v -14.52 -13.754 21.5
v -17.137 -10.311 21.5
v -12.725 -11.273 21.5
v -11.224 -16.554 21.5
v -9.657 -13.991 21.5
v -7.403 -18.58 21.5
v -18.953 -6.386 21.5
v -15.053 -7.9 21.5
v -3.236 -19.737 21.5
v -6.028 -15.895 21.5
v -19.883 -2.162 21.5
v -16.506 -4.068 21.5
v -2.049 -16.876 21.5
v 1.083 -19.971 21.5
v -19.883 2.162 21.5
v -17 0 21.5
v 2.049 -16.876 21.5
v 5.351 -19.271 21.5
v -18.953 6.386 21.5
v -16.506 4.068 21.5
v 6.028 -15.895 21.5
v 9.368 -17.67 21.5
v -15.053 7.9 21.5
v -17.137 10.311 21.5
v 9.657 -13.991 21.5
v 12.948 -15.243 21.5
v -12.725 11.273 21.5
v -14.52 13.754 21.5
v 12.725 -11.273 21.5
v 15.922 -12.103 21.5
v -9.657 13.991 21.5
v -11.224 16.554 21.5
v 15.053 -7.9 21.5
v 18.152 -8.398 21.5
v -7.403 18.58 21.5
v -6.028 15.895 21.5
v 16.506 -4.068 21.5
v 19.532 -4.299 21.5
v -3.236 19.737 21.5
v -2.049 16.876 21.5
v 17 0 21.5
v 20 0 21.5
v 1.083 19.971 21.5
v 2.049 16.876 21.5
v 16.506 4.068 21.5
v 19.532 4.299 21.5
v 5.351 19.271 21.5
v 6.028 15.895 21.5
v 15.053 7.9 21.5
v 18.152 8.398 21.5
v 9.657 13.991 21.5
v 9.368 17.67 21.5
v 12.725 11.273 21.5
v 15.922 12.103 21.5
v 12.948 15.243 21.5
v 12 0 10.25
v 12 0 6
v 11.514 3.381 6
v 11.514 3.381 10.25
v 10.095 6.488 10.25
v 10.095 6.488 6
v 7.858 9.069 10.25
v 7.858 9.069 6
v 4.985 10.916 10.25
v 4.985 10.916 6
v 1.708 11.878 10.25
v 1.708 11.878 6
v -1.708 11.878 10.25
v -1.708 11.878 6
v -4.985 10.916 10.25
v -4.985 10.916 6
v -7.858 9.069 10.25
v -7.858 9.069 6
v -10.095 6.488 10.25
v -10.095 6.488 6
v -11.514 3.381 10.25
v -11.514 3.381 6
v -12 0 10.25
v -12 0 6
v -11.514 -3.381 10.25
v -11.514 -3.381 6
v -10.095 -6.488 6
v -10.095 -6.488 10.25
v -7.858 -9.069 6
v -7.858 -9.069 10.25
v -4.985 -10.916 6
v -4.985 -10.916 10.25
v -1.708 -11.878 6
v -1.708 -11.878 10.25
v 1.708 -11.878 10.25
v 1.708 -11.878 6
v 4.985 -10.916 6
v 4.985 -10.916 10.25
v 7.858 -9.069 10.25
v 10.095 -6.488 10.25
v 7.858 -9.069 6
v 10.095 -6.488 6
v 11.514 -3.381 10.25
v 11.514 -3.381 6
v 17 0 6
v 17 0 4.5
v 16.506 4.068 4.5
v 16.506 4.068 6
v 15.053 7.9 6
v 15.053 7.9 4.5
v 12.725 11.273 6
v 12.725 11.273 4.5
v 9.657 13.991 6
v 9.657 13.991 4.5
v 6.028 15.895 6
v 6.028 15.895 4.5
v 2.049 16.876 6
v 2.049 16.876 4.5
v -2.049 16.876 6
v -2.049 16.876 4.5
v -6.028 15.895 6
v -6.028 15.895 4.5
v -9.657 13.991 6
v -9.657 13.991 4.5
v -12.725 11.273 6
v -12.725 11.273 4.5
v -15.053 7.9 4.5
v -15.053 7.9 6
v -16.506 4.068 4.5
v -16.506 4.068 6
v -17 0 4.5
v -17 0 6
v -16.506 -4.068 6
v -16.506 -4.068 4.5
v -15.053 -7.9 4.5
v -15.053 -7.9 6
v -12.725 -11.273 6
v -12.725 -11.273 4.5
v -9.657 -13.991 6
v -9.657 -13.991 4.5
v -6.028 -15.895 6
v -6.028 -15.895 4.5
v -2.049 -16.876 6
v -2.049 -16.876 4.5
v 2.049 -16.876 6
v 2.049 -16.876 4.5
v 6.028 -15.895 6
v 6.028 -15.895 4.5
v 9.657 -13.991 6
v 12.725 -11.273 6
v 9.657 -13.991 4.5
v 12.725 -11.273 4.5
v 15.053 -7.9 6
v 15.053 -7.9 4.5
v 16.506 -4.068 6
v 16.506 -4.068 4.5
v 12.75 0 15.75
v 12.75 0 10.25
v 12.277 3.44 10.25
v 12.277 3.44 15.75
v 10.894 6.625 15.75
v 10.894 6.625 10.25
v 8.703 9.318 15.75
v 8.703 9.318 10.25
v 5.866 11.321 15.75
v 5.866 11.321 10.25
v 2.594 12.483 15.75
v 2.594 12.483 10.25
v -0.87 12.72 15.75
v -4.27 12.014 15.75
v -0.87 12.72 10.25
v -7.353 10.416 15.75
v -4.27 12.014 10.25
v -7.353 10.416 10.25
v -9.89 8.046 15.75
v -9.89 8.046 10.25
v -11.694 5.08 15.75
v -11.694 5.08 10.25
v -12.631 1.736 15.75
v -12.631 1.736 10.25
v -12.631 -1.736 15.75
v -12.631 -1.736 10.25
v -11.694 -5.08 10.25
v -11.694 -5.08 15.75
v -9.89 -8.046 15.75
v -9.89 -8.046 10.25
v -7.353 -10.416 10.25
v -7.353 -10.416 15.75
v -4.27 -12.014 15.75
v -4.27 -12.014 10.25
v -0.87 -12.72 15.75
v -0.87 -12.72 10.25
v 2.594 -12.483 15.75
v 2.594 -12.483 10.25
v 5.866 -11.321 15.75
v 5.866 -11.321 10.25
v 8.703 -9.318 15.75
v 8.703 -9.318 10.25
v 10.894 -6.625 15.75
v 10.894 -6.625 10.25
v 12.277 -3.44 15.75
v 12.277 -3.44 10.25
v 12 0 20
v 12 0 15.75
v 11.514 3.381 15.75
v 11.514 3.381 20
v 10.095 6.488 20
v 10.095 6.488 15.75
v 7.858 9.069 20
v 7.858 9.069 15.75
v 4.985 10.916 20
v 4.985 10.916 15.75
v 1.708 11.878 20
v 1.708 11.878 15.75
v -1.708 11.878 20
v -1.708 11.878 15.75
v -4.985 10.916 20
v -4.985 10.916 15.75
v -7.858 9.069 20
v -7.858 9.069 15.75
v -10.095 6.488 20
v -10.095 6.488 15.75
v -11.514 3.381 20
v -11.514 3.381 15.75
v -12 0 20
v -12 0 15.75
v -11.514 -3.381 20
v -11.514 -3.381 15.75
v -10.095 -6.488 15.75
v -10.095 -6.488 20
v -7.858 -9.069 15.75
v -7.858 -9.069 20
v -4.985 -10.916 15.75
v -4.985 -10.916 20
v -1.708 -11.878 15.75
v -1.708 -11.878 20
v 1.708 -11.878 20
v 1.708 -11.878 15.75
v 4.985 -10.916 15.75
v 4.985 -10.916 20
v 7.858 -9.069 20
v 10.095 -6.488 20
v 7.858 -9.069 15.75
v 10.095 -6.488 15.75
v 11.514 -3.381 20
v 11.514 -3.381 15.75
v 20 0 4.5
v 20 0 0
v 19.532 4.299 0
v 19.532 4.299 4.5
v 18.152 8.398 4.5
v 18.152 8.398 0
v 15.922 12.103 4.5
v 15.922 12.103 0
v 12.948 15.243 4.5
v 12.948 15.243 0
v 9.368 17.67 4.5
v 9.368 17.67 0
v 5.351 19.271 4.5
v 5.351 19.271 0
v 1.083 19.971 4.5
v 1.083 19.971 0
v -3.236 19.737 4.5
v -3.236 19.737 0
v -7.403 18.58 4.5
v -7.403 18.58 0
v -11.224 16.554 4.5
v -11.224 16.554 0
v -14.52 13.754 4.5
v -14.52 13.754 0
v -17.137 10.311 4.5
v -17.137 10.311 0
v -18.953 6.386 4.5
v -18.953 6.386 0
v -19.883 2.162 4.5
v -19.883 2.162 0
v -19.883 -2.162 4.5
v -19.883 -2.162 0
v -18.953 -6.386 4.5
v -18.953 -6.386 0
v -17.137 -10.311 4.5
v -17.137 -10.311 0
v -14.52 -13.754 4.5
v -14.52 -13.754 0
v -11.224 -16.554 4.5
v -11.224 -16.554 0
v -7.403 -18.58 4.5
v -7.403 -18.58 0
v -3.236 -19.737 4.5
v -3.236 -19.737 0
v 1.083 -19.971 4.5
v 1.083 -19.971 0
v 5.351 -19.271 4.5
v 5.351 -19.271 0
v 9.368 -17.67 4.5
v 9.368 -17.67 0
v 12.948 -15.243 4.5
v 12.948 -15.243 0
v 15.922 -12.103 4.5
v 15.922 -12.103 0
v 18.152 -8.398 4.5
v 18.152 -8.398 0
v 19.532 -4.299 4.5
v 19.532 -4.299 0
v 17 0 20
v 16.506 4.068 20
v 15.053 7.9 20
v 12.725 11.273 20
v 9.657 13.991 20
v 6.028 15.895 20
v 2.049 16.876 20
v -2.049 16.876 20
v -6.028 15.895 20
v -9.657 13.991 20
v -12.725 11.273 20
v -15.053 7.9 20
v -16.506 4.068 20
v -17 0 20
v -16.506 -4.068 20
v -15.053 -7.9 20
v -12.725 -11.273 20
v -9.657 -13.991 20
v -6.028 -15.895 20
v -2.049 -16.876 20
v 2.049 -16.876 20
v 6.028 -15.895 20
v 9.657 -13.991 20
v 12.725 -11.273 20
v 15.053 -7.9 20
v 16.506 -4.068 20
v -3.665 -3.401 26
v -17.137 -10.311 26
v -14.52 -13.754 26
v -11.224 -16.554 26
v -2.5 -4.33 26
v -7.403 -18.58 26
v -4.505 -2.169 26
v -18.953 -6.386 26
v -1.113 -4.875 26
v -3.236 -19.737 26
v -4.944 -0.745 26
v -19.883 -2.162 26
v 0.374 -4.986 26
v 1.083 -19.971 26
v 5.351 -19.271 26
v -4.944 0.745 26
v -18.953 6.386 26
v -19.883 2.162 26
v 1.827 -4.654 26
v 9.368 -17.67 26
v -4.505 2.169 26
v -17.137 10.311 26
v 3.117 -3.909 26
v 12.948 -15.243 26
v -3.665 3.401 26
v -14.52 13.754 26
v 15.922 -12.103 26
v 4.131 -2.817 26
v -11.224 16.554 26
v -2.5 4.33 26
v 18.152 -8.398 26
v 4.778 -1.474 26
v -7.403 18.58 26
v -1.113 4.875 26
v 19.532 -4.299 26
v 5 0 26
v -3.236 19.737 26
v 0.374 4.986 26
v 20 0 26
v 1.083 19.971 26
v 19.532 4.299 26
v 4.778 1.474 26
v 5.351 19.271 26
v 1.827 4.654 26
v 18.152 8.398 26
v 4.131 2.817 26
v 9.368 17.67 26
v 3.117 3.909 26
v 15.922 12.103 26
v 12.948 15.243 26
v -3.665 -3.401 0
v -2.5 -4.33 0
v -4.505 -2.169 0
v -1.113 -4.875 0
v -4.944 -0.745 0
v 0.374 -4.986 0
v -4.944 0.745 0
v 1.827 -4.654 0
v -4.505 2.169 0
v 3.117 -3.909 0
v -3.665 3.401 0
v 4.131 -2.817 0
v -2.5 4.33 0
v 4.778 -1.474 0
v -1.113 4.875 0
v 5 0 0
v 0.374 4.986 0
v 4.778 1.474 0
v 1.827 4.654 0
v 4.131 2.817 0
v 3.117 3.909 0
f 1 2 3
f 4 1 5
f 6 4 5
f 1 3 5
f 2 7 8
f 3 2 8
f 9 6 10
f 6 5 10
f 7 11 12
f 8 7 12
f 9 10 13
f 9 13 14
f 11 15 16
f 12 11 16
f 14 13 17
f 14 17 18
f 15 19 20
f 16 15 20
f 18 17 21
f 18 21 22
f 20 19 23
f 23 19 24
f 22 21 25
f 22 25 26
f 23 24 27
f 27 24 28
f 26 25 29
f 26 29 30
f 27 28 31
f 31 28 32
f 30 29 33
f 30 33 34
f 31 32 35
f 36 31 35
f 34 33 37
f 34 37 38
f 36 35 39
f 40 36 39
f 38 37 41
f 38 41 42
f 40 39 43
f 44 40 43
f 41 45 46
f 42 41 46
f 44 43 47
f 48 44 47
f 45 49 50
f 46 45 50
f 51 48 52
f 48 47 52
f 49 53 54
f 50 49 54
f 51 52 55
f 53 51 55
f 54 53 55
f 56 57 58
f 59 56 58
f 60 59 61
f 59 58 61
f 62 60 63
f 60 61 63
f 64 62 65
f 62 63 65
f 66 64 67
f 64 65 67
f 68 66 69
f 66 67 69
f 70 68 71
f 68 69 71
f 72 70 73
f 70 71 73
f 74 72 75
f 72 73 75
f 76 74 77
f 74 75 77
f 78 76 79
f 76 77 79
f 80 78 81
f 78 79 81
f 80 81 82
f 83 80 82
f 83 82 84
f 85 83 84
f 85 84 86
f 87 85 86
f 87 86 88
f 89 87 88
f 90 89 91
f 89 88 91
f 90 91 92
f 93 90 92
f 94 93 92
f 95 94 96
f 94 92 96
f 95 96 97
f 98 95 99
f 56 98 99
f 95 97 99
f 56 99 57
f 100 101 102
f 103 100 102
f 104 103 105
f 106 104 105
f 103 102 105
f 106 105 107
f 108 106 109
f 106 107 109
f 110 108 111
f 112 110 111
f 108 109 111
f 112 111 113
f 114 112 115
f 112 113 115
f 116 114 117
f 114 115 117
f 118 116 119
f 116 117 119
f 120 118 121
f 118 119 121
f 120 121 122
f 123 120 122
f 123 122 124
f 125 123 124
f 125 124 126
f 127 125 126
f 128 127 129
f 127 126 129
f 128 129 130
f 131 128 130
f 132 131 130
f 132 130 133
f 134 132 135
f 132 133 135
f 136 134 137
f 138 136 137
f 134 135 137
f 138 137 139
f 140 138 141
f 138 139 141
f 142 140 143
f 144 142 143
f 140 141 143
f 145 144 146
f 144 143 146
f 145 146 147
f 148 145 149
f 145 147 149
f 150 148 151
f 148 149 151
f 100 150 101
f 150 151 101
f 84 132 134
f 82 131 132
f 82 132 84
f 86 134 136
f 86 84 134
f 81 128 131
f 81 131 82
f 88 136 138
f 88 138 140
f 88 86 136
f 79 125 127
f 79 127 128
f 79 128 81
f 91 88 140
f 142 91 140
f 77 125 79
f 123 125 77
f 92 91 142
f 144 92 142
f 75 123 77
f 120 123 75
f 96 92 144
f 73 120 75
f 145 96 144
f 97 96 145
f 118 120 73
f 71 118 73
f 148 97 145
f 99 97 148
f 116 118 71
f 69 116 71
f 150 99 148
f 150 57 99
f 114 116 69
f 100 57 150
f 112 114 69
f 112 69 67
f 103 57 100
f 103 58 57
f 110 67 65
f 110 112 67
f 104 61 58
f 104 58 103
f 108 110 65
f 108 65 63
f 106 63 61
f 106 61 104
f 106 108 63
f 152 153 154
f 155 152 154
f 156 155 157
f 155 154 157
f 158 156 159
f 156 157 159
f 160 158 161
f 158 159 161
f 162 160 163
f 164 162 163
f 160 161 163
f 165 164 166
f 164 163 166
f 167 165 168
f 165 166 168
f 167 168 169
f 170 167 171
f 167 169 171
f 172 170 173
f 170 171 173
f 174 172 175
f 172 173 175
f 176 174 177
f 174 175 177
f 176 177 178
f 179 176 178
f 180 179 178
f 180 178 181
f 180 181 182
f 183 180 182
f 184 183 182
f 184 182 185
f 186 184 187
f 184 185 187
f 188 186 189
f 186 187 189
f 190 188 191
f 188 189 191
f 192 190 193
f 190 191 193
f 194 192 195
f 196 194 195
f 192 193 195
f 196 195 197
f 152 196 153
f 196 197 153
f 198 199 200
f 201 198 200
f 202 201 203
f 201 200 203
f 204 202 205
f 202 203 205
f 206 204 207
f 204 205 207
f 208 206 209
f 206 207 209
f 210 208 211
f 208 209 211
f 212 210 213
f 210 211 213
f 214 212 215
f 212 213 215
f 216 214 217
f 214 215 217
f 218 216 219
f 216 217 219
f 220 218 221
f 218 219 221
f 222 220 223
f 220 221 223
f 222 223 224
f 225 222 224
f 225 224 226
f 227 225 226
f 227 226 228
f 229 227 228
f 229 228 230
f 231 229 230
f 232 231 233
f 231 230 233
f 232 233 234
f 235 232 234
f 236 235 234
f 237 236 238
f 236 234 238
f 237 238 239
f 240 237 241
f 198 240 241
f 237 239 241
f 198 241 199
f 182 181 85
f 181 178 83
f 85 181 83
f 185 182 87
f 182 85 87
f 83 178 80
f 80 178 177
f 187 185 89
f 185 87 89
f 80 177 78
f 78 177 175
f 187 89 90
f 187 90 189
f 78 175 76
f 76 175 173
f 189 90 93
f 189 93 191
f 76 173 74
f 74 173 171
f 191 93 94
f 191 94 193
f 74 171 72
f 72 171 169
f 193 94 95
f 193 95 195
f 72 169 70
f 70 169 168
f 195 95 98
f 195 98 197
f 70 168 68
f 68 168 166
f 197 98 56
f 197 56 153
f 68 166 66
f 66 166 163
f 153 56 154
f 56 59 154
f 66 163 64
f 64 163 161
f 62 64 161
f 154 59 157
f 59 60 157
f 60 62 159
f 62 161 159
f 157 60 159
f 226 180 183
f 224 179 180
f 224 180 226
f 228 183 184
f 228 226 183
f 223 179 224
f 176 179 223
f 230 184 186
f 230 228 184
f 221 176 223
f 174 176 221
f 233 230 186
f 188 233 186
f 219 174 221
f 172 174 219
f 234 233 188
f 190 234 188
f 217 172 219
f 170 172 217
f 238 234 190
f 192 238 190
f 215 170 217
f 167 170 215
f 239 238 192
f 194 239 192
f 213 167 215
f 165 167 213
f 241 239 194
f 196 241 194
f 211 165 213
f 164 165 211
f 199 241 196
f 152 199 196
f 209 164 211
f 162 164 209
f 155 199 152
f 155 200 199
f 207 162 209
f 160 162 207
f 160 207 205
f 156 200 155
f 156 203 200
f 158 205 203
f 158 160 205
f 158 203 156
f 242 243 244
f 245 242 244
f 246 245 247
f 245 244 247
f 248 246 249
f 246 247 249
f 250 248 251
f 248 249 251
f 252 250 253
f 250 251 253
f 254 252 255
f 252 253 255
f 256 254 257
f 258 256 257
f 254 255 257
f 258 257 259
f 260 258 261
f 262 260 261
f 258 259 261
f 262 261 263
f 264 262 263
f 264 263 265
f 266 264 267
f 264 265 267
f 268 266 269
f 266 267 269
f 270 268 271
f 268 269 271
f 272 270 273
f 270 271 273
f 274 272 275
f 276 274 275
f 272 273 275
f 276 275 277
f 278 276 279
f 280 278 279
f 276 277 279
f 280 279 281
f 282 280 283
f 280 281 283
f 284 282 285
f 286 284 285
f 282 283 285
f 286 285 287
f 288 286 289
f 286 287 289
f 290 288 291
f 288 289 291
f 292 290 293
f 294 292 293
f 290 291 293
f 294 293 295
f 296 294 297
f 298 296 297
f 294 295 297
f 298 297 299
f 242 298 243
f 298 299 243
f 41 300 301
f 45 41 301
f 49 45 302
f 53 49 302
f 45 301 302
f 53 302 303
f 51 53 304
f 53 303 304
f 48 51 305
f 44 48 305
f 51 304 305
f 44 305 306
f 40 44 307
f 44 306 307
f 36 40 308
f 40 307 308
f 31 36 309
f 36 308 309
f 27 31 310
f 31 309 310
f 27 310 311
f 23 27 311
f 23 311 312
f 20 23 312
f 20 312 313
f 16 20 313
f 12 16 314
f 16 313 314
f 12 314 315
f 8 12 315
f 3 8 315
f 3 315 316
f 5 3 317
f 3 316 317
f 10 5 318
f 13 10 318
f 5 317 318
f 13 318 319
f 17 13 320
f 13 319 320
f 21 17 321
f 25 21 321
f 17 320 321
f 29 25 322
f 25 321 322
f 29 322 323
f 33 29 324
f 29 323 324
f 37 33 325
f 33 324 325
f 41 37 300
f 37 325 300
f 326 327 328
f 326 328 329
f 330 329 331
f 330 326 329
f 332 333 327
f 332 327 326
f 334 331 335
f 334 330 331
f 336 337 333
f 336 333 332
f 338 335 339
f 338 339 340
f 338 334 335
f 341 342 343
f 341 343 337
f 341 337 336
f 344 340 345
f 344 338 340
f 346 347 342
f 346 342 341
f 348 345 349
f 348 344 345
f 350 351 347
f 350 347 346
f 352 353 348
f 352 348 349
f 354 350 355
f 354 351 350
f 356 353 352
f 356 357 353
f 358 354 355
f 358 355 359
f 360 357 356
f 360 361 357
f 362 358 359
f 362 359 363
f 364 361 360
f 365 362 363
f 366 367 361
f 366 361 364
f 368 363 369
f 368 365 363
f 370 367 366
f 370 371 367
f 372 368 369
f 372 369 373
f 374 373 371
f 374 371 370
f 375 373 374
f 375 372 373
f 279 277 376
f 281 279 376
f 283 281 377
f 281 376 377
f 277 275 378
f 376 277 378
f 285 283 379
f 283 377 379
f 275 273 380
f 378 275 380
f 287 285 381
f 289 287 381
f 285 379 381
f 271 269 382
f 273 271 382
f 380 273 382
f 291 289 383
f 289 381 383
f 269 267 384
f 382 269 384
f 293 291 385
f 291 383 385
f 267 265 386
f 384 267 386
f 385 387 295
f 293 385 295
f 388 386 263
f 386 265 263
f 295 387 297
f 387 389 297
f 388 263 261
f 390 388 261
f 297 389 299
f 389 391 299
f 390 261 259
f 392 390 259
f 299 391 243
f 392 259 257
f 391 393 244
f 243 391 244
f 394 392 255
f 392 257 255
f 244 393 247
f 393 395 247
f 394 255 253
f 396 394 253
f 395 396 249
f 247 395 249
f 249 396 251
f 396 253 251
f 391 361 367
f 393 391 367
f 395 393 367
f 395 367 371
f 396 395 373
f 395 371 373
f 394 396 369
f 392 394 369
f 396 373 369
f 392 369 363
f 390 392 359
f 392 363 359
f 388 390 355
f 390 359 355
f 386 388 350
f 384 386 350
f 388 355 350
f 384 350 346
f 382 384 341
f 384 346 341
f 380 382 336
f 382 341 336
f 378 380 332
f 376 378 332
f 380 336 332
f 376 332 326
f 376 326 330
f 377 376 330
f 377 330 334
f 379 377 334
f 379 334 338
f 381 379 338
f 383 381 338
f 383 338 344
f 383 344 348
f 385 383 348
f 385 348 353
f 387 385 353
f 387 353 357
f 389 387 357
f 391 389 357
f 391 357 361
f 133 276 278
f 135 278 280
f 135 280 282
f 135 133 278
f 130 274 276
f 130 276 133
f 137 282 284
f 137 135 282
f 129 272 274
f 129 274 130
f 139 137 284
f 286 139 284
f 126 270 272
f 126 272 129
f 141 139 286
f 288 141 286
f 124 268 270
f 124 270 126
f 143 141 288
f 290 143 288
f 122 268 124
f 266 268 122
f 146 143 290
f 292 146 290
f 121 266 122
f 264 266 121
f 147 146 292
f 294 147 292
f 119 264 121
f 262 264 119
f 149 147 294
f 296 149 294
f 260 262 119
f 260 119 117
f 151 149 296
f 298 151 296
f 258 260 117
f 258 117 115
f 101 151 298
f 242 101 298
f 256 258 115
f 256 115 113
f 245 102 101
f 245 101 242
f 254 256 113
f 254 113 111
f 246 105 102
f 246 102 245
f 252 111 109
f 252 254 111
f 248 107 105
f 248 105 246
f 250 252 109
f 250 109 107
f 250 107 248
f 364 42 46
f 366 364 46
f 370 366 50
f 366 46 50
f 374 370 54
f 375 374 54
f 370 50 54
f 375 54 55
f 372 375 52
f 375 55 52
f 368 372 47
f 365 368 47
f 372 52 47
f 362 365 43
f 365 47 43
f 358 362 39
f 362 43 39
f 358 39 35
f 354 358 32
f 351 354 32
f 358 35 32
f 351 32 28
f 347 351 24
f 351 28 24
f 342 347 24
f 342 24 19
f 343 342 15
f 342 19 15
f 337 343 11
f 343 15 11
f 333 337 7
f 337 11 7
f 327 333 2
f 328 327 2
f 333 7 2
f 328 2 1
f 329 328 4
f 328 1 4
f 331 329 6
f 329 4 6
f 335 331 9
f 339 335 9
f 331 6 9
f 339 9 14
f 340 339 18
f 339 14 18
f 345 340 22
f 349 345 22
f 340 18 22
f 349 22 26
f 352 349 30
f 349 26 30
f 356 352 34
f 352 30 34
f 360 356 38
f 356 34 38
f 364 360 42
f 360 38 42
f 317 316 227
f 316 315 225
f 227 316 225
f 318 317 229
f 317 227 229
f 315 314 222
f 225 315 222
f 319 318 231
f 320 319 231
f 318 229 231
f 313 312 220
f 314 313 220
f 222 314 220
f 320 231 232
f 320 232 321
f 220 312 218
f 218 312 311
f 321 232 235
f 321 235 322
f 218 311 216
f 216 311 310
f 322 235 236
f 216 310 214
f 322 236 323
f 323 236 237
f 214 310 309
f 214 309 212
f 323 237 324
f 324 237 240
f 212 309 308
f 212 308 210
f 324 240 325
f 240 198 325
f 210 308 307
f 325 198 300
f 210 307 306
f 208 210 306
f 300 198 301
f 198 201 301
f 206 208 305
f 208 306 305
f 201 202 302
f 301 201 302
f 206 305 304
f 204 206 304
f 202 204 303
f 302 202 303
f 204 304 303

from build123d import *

# Parameters (mm, degrees)
F0_R      = 20
F1_DEPTH  = 4.5
F2_R      = 17
F3_DEPTH  = 1.5
F4_R      = 12
F5_DEPTH  = 4.25
F6_R      = 12.75
F7_DEPTH  = 5.5
F8_R      = 12
F9_DEPTH  = 4.25
F10_R     = 17
F11_DEPTH = 1.5
F12_R     = 20
F13_DEPTH = 4.5
F14_R     = 5
F15_DEPTH = 30


with BuildPart() as f1:
    # F0 (on Top) → F1 (new body)
    with BuildSketch(Plane.XY):
        Circle(F0_R)
    extrude(amount=F1_DEPTH)

    # F2 (on face) → F3 (join)
    with BuildSketch(Plane.XY.offset(4.5)):
        Circle(F2_R)
    extrude(amount=F3_DEPTH)

    # F4 (on face) → F5 (join)
    with BuildSketch(Plane.XY.offset(6)):
        Circle(F4_R)
    extrude(amount=F5_DEPTH)

    # F6 (on face) → F7 (join)
    with BuildSketch(Plane.XY.offset(10.25)):
        Circle(F6_R)
    extrude(amount=F7_DEPTH)

    # F8 (on face) → F9 (join)
    with BuildSketch(Plane.XY.offset(15.75)):
        Circle(F8_R)
    extrude(amount=F9_DEPTH)

    # F10 (on face) → F11 (join)
    with BuildSketch(Plane.XY.offset(20)):
        Circle(F10_R)
    extrude(amount=F11_DEPTH)

    # F12 (on face) → F13 (join)
    with BuildSketch(Plane.XY.offset(21.5)):
        Circle(F12_R)
    extrude(amount=F13_DEPTH)

    # F14 (on face) → F15 (cut)
    with BuildSketch(Plane.XY.offset(26)):
        Circle(F14_R)
    extrude(amount=-F15_DEPTH, mode=Mode.SUBTRACT)


solid = f1.part
